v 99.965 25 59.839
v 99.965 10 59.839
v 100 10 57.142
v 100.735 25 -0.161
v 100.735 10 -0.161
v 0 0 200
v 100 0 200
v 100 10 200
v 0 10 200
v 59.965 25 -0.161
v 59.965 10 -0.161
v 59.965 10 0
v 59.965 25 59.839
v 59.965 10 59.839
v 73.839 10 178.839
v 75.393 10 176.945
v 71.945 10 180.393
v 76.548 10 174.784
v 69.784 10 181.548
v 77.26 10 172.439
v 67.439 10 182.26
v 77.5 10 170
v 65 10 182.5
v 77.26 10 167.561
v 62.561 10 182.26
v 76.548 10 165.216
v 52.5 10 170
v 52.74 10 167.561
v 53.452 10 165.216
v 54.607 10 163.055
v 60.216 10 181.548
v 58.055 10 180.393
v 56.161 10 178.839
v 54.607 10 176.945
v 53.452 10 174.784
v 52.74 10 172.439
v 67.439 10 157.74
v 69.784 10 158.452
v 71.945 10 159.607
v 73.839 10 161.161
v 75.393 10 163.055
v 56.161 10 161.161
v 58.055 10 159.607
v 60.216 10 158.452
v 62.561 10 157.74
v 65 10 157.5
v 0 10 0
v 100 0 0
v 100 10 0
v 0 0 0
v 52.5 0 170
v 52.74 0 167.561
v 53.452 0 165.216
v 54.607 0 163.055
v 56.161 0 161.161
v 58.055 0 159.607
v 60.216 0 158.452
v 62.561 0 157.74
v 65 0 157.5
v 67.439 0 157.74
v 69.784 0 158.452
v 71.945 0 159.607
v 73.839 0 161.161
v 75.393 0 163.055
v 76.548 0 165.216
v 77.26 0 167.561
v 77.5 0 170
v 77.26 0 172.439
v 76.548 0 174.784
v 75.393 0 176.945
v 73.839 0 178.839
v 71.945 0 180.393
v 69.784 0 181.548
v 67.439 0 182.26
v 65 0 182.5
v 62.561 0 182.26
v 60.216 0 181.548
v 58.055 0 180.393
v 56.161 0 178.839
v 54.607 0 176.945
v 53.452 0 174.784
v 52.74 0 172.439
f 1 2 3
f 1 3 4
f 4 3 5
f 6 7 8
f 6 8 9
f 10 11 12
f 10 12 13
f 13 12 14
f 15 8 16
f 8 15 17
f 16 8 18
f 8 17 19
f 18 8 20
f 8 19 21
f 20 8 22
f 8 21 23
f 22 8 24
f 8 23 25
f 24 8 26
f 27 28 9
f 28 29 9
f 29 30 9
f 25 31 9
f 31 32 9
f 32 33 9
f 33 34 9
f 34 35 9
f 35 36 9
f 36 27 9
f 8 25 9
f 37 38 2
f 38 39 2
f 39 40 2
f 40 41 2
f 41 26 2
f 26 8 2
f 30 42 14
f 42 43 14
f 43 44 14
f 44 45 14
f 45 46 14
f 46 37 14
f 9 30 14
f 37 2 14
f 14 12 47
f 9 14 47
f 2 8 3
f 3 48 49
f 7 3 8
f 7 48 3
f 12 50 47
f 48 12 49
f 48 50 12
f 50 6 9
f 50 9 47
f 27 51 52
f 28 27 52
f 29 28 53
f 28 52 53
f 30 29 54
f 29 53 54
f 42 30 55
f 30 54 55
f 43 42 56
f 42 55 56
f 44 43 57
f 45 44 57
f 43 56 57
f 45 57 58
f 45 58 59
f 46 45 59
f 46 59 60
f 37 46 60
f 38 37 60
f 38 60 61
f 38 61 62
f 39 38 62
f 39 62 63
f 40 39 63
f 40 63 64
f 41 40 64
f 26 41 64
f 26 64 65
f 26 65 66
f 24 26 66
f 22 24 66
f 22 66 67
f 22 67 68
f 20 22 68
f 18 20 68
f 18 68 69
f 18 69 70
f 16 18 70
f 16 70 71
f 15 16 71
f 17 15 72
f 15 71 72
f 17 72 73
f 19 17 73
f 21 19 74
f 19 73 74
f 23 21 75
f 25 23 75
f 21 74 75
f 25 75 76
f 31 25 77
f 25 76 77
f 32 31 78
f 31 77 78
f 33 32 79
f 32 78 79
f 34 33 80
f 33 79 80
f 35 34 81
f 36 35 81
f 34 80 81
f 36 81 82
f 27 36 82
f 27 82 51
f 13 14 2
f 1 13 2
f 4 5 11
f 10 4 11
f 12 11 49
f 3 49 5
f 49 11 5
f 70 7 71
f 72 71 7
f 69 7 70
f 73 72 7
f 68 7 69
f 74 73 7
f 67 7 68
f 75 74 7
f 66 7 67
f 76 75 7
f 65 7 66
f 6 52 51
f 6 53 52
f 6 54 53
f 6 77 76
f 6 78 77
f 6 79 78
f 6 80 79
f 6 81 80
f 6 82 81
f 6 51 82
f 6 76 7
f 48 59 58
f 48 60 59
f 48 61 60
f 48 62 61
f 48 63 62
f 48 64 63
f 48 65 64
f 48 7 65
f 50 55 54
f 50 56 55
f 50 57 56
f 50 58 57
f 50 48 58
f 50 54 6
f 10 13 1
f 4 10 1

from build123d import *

# Parameters (mm, degrees)
BOSS_EXTRUDE1_DEPTH    = 10
BOSS_EXTRUDE2_DEPTH    = 15
F_25_0MM_DOWEL_HOLE1_D = 25


with BuildPart() as part:
    # Sketch2 → Boss-Extrude1 (new body)
    with BuildSketch(Plane(origin=(0, 0, 0), x_dir=(1, 0, 0), z_dir=(0, 1, 0))):
        Polygon((0, 0), (100.00000548, 0), (100, -200), (0, -200.00001096), align=None)
    extrude(amount=BOSS_EXTRUDE1_DEPTH)

    # Sketch3 → Boss-Extrude2 (add)
    with BuildSketch(Plane(origin=(0.867898509, 10, -1.693868364), x_dir=(1, 0, 0), z_dir=(0, 1, 0))):
        Polygon((59.097520158, -1.533073759), (59.097520158, -61.533073759), (99.097520158, -61.533073759), (99.866800969, -1.533073759), align=None)
    extrude(amount=BOSS_EXTRUDE2_DEPTH)

    # Ø25.0mm Dowel Hole1 (through all)
    with Locations(Plane(origin=(0, 10, 0), x_dir=(1, 0, 0), z_dir=(0, 1, 0))):
        with Locations((65, -170)):
            Hole(F_25_0MM_DOWEL_HOLE1_D / 2)


solid = part.part
